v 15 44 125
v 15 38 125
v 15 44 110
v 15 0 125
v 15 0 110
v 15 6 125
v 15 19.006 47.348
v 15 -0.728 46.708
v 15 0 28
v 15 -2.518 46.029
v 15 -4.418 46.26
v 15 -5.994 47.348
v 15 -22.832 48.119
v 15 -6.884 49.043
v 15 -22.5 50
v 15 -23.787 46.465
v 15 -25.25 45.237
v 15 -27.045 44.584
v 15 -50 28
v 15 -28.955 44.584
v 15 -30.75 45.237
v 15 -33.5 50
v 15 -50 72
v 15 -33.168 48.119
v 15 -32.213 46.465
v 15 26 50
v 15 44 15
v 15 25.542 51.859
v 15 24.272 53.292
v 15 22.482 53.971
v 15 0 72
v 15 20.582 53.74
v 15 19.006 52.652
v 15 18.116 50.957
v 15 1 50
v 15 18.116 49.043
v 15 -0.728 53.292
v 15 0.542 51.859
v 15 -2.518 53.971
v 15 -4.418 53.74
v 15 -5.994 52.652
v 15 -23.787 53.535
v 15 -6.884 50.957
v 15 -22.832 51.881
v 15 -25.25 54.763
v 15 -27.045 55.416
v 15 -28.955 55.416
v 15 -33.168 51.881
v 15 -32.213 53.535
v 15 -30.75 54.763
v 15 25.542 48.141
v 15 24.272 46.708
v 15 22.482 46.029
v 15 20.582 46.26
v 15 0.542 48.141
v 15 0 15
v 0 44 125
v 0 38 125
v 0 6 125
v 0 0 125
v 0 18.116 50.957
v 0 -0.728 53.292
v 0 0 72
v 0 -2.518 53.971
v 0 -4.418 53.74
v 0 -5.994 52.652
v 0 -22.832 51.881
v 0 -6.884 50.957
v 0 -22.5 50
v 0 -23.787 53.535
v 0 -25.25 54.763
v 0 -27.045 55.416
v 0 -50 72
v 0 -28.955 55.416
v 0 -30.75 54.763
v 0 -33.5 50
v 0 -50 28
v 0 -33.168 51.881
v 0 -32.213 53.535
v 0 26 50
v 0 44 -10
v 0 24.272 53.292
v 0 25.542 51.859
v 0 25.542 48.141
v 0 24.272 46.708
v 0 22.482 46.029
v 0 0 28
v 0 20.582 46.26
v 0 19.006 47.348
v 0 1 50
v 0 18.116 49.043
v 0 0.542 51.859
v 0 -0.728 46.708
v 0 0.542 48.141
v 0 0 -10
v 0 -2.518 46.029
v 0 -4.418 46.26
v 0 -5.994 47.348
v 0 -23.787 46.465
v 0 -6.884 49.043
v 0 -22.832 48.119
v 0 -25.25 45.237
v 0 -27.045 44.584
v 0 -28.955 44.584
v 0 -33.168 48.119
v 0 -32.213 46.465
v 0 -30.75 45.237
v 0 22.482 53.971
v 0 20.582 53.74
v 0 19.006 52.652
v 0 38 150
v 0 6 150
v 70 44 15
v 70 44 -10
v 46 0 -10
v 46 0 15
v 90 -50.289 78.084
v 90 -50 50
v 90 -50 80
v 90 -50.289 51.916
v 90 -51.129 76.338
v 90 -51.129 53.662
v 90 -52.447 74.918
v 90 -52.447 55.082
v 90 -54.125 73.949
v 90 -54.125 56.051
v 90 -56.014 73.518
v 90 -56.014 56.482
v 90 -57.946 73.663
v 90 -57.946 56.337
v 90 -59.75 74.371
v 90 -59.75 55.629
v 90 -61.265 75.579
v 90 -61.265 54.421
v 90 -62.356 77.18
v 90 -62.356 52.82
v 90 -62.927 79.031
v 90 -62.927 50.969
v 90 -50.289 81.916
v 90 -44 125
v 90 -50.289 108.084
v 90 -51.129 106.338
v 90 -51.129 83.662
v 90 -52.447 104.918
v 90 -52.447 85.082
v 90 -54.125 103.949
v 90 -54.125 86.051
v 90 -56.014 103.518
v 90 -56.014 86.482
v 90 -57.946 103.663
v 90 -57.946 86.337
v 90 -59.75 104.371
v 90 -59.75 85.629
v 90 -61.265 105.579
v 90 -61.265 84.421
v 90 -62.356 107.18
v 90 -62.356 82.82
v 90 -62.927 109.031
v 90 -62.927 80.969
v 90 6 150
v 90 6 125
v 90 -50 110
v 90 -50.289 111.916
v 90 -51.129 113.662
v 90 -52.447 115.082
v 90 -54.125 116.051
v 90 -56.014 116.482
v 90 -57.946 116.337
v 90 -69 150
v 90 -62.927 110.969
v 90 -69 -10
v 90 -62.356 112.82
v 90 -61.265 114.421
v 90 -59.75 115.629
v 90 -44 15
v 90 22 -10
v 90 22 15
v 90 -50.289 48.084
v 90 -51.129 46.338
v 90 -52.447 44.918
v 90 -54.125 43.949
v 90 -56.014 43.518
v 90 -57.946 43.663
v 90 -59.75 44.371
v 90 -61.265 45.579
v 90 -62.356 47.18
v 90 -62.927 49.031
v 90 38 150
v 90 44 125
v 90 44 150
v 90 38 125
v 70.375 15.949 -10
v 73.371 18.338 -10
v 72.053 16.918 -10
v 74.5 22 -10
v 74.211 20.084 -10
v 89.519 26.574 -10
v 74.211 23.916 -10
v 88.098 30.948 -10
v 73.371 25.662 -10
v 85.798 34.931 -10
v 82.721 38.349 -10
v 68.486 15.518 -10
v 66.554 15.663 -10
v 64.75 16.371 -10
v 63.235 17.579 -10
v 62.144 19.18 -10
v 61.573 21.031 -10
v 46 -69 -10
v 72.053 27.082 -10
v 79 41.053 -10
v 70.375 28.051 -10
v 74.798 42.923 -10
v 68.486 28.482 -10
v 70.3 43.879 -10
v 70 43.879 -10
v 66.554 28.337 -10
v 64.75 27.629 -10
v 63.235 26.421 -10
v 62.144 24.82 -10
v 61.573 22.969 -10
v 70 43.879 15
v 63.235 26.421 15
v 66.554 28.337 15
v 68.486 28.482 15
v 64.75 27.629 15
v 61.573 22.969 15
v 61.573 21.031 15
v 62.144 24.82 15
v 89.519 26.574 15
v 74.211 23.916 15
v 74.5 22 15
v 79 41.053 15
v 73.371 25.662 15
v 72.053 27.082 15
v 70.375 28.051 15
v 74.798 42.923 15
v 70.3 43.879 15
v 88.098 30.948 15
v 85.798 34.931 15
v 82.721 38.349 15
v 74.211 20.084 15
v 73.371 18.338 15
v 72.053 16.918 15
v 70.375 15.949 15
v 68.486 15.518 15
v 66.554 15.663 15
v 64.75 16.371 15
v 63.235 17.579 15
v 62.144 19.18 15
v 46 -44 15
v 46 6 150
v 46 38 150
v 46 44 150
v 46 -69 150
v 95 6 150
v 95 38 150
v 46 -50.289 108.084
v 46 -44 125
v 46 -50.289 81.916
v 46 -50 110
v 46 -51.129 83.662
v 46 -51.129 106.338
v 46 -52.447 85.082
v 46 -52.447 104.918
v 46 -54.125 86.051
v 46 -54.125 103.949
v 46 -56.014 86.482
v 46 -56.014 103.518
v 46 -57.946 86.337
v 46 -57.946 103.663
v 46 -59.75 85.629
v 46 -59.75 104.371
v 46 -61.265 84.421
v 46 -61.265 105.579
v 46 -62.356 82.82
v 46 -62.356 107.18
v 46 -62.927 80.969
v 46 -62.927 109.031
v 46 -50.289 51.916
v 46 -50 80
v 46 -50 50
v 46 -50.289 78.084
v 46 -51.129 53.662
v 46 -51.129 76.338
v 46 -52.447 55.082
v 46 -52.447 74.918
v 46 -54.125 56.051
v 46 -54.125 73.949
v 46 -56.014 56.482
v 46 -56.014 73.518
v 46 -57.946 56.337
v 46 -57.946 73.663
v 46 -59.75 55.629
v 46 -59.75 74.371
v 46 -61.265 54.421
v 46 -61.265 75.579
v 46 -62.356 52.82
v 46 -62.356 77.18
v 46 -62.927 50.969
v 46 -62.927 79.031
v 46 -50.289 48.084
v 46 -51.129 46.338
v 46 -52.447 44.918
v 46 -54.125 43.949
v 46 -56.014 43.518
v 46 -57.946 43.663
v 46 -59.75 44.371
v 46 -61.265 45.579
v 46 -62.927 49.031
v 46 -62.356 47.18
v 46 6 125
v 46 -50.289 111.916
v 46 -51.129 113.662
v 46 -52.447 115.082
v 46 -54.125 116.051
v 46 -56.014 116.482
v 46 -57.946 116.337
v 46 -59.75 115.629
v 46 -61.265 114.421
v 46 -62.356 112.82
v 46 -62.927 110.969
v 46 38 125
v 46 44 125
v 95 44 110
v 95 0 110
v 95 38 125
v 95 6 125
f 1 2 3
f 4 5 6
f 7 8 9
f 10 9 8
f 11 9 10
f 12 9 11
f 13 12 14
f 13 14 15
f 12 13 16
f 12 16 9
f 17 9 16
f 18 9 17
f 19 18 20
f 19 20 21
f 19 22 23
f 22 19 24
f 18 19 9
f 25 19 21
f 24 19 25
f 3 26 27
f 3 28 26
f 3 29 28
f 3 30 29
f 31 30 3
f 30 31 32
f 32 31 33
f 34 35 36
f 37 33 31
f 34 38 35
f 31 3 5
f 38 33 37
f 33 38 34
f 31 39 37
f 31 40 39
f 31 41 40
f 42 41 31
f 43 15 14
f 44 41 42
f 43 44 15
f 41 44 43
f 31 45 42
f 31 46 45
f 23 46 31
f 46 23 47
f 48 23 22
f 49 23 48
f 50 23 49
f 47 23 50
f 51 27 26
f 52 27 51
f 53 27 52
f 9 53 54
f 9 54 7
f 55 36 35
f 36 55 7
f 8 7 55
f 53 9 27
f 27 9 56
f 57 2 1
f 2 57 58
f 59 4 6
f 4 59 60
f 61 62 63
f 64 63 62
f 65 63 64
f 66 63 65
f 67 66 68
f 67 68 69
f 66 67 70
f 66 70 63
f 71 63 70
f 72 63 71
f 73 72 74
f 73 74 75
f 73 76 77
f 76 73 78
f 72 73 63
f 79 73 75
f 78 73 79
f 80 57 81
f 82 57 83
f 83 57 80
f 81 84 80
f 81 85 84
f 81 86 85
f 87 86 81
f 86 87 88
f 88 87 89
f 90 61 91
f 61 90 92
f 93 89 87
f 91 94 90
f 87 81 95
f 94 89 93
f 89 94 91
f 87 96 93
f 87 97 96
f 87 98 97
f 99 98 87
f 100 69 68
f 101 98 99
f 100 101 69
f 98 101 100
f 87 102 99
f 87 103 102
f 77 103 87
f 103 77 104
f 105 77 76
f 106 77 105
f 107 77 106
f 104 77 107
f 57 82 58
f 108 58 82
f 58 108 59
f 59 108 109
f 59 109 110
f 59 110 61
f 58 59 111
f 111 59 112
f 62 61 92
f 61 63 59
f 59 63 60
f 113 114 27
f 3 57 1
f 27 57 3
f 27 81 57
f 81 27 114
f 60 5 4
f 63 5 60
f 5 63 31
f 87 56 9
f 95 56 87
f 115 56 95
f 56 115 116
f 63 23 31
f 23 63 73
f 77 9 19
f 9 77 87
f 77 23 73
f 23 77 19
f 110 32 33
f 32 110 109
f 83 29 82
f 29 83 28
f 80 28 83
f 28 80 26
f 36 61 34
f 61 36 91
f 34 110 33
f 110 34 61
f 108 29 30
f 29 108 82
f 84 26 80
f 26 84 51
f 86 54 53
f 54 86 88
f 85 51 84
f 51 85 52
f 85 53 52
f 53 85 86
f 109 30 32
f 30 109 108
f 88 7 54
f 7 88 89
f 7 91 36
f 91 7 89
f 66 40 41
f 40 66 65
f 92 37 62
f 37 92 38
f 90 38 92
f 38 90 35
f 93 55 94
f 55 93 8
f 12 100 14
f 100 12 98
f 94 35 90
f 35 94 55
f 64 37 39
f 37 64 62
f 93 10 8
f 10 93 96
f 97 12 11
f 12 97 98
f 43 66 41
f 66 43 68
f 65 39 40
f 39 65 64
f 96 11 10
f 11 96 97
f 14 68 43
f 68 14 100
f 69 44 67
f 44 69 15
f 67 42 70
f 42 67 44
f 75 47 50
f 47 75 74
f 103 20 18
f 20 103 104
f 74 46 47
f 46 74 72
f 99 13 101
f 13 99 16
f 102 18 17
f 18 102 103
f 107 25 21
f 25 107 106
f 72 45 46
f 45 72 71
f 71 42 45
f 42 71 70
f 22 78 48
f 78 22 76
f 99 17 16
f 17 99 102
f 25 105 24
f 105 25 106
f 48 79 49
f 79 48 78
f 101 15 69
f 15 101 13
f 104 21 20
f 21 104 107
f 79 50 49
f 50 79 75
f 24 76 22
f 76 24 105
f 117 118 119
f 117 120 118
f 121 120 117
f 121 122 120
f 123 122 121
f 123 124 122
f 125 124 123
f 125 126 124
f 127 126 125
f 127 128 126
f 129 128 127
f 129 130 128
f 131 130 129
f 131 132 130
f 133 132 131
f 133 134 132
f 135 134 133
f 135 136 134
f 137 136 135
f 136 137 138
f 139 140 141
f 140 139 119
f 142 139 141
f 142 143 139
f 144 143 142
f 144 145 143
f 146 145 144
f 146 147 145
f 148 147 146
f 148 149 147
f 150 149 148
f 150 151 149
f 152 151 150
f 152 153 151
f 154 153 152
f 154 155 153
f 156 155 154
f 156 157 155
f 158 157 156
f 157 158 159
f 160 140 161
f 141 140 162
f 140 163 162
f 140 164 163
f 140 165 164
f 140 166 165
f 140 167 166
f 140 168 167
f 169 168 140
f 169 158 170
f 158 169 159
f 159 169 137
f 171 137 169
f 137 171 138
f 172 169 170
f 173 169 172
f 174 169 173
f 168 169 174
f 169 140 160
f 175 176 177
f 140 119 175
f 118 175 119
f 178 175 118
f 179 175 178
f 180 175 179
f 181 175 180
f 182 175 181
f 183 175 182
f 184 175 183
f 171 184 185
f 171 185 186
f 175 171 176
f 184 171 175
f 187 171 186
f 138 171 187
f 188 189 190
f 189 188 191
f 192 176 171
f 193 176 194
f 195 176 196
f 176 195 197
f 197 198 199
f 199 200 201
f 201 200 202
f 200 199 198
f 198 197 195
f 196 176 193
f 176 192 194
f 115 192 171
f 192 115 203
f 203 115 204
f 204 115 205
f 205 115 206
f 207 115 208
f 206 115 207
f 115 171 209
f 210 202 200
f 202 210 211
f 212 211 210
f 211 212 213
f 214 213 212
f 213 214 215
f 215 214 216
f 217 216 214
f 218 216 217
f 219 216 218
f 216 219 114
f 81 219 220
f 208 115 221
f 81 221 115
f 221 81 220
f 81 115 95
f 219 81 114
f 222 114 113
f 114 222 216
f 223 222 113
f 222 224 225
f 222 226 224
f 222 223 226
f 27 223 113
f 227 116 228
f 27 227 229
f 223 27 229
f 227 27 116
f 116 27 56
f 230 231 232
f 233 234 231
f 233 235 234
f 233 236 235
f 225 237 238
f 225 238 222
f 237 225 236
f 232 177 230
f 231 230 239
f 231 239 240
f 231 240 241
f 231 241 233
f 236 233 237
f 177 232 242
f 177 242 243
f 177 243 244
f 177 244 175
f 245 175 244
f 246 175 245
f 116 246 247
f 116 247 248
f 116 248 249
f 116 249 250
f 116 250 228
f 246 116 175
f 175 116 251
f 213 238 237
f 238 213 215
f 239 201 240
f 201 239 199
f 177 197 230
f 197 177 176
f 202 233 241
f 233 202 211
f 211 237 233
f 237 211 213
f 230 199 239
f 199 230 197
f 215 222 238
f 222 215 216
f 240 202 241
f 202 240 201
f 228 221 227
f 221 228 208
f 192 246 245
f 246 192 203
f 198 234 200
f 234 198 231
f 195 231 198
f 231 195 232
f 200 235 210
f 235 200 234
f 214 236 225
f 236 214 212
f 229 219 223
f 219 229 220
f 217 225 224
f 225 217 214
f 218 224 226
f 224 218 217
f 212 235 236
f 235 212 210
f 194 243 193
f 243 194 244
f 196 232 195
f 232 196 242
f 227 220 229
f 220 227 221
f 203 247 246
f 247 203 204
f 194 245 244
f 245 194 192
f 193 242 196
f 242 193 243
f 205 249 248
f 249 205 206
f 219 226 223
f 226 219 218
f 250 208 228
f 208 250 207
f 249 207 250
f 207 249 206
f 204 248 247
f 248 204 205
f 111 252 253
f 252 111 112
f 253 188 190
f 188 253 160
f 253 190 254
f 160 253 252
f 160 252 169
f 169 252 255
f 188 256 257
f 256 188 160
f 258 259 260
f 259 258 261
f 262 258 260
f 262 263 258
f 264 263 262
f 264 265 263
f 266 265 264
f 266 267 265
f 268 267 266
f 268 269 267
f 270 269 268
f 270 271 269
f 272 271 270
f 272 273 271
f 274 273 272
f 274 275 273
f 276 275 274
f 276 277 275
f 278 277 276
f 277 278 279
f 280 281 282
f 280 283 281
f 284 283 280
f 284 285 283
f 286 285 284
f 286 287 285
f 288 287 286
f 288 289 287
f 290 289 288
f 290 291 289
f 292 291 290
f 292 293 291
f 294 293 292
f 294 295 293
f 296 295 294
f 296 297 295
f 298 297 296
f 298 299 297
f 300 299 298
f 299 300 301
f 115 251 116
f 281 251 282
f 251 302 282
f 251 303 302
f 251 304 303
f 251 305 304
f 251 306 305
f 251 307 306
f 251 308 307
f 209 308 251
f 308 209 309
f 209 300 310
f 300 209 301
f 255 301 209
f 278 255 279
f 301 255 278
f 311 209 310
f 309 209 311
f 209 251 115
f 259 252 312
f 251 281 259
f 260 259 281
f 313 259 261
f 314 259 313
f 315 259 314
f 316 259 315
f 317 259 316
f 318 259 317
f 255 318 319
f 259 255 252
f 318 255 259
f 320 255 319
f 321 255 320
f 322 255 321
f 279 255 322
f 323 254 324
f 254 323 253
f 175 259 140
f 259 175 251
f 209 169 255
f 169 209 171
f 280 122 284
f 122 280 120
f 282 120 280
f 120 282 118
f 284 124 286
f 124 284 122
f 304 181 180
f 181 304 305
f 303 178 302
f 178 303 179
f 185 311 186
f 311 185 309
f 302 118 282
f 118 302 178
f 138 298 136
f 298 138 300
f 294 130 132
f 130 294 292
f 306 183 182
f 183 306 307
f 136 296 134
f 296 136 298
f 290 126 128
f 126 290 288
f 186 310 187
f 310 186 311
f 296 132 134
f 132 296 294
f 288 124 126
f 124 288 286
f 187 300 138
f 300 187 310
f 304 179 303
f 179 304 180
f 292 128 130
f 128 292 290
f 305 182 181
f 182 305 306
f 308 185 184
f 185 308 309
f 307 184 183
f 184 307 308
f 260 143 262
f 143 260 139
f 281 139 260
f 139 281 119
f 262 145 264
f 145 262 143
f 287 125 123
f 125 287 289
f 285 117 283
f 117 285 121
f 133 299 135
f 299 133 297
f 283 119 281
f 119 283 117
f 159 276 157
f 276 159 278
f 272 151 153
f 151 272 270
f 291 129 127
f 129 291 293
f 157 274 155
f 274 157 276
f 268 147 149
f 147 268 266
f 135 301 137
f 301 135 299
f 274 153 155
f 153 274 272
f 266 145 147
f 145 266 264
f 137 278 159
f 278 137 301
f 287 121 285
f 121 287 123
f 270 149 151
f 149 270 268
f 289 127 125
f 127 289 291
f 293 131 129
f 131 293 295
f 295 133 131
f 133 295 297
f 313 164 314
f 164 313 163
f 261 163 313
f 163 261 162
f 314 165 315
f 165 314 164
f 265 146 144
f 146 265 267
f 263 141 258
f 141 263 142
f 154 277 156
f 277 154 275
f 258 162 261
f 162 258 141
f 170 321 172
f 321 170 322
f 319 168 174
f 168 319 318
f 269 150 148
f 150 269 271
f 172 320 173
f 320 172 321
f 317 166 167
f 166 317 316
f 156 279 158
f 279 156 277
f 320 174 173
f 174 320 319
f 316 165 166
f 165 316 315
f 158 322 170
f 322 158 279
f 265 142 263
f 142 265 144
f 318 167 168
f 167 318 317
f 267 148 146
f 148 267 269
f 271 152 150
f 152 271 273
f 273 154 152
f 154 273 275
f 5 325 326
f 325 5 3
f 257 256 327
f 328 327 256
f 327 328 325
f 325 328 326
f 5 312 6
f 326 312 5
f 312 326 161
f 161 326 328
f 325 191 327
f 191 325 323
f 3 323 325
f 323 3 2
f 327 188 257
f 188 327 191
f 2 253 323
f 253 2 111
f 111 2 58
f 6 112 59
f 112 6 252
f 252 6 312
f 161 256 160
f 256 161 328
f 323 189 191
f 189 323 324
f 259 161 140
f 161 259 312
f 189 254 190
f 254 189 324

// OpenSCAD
//定义变量
dovetail_base=44;
dovetail_top=32;
dovetail_height=15;
dual_arms_gap=160;
dual_arms_connector=125;
dual_arm_counterweight=75+15;
dual_arm_dovetail=80+15;
dual_arm_append_thickness=10;
 //望远镜底座：25毫米，3/8，1/4，1/4

Dovetail_CubePoints = [
  [  0,  0,  0 ],  //0
  [ dual_arm_dovetail,  0,  0 ],  //1
  [ dual_arm_dovetail,  dovetail_base,  0 ],  //2
  [  0,  dovetail_base,  0 ],  //3

  [  0,  (dovetail_base-dovetail_top)/2,  dovetail_height ],  //4
  [ dual_arm_dovetail,  (dovetail_base-dovetail_top)/2,  dovetail_height ],  //5
  [ dual_arm_dovetail,  dovetail_base-(dovetail_base-dovetail_top)/2,  dovetail_height ],  //6
  [  0,  dovetail_base-(dovetail_base-dovetail_top)/2,  dovetail_height ]]; //7
  
Dovetail_CubeFaces = [
  [0,1,2,3],  // bottom
  [4,5,1,0],  // front
  [7,6,5,4],  // top
  [5,6,2,1],  // right
  [6,7,3,2],  // back
  [7,4,0,3]]; // left
  




//U型框架区域

//置物平板
difference(){
 union(){

cube([dovetail_height,dovetail_base,dual_arms_connector]);


translate([0,-50,dual_arms_connector-75-dovetail_base/2])
{cube([dovetail_height,50,dovetail_base]);}
}

//望远镜固定螺孔1
rotate([90,0,90]){
translate([dovetail_base/2,dual_arms_connector-75 ,-10]){
cylinder(dovetail_height*6,4,4);}}

//望远镜固定螺孔2
rotate([90,0,90]){
translate([dovetail_base/2-25,dual_arms_connector-75 ,-10]){
cylinder(dovetail_height*6,4,4);}}

//望远镜固定螺孔3
rotate([90,0,90]){
translate([dovetail_base/2-25-25,dual_arms_connector-75 ,-10]){
cylinder(dovetail_height*6,5.5,5.5);}}
}
 
//鸠尾板
translate([0,0,dual_arms_connector-dovetail_height]){
polyhedron( Dovetail_CubePoints, Dovetail_CubeFaces );
}

translate([0,(dovetail_base-dovetail_top)/2,dual_arms_connector]){
cube([dual_arm_dovetail,dovetail_top,dual_arm_append_thickness+dovetail_height]);}


//重锤连接杆支撑臂
difference(){
union(){
translate([0,0,0]){
cube([dual_arm_counterweight,dovetail_base/2,dovetail_height]);}
translate([0,dovetail_base/2,0]){
cube([dual_arm_counterweight-20,dovetail_base/2,dovetail_height]);
}

translate([0,0,-dual_arm_append_thickness]){
cube([dual_arm_counterweight,dovetail_base/2,dual_arm_append_thickness]);

translate([0,dovetail_base/2,0]){cube([dual_arm_counterweight-20,dovetail_base/2,dual_arm_append_thickness]);}

}

translate([dual_arm_counterweight-dovetail_base/2,dovetail_base/2,-dual_arm_append_thickness]){
cylinder(dovetail_height+dual_arm_append_thickness,dovetail_base/2,dovetail_base/2);}
}
translate([dual_arm_counterweight-dovetail_base/2,dovetail_base/2,0]){
cylinder(dovetail_height*4,6.5,6.5,center=true);}

}



//外接重锤平台
difference(){
translate([dual_arm_counterweight-dovetail_base,-dovetail_base-dovetail_height-dual_arm_append_thickness,-dual_arm_append_thickness]){cube([dovetail_base,dovetail_height+dual_arm_append_thickness,dual_arm_append_thickness*2+dovetail_height+dual_arms_connector]);}

rotate([90,0,90]){
translate([-dovetail_base-0.5*(dovetail_height+dual_arm_append_thickness),dual_arms_connector-75 ,0]){
cylinder(dovetail_height*7,6.5,6.5);}}

rotate([90,0,90]){
translate([-dovetail_base-0.5*(dovetail_height+dual_arm_append_thickness),dual_arms_connector-75+30 ,0]){
cylinder(dovetail_height*7,6.5,6.5);}}

rotate([90,0,90]){
translate([-dovetail_base-0.5*(dovetail_height+dual_arm_append_thickness),dual_arms_connector-75+60 ,0]){
cylinder(dovetail_height*7,6.5,6.5);}}

}

 

//重锤杆端连接件
translate([dual_arm_counterweight-dovetail_base,-dovetail_base,-dual_arm_append_thickness]){cube([dovetail_base,dovetail_base,dual_arm_append_thickness+dovetail_height]);}

//鸠尾板端连接件
translate([dual_arm_counterweight-dovetail_base,-dovetail_base,dual_arms_connector]){cube([dovetail_base,dovetail_base*2,dual_arm_append_thickness+dovetail_height]);}
